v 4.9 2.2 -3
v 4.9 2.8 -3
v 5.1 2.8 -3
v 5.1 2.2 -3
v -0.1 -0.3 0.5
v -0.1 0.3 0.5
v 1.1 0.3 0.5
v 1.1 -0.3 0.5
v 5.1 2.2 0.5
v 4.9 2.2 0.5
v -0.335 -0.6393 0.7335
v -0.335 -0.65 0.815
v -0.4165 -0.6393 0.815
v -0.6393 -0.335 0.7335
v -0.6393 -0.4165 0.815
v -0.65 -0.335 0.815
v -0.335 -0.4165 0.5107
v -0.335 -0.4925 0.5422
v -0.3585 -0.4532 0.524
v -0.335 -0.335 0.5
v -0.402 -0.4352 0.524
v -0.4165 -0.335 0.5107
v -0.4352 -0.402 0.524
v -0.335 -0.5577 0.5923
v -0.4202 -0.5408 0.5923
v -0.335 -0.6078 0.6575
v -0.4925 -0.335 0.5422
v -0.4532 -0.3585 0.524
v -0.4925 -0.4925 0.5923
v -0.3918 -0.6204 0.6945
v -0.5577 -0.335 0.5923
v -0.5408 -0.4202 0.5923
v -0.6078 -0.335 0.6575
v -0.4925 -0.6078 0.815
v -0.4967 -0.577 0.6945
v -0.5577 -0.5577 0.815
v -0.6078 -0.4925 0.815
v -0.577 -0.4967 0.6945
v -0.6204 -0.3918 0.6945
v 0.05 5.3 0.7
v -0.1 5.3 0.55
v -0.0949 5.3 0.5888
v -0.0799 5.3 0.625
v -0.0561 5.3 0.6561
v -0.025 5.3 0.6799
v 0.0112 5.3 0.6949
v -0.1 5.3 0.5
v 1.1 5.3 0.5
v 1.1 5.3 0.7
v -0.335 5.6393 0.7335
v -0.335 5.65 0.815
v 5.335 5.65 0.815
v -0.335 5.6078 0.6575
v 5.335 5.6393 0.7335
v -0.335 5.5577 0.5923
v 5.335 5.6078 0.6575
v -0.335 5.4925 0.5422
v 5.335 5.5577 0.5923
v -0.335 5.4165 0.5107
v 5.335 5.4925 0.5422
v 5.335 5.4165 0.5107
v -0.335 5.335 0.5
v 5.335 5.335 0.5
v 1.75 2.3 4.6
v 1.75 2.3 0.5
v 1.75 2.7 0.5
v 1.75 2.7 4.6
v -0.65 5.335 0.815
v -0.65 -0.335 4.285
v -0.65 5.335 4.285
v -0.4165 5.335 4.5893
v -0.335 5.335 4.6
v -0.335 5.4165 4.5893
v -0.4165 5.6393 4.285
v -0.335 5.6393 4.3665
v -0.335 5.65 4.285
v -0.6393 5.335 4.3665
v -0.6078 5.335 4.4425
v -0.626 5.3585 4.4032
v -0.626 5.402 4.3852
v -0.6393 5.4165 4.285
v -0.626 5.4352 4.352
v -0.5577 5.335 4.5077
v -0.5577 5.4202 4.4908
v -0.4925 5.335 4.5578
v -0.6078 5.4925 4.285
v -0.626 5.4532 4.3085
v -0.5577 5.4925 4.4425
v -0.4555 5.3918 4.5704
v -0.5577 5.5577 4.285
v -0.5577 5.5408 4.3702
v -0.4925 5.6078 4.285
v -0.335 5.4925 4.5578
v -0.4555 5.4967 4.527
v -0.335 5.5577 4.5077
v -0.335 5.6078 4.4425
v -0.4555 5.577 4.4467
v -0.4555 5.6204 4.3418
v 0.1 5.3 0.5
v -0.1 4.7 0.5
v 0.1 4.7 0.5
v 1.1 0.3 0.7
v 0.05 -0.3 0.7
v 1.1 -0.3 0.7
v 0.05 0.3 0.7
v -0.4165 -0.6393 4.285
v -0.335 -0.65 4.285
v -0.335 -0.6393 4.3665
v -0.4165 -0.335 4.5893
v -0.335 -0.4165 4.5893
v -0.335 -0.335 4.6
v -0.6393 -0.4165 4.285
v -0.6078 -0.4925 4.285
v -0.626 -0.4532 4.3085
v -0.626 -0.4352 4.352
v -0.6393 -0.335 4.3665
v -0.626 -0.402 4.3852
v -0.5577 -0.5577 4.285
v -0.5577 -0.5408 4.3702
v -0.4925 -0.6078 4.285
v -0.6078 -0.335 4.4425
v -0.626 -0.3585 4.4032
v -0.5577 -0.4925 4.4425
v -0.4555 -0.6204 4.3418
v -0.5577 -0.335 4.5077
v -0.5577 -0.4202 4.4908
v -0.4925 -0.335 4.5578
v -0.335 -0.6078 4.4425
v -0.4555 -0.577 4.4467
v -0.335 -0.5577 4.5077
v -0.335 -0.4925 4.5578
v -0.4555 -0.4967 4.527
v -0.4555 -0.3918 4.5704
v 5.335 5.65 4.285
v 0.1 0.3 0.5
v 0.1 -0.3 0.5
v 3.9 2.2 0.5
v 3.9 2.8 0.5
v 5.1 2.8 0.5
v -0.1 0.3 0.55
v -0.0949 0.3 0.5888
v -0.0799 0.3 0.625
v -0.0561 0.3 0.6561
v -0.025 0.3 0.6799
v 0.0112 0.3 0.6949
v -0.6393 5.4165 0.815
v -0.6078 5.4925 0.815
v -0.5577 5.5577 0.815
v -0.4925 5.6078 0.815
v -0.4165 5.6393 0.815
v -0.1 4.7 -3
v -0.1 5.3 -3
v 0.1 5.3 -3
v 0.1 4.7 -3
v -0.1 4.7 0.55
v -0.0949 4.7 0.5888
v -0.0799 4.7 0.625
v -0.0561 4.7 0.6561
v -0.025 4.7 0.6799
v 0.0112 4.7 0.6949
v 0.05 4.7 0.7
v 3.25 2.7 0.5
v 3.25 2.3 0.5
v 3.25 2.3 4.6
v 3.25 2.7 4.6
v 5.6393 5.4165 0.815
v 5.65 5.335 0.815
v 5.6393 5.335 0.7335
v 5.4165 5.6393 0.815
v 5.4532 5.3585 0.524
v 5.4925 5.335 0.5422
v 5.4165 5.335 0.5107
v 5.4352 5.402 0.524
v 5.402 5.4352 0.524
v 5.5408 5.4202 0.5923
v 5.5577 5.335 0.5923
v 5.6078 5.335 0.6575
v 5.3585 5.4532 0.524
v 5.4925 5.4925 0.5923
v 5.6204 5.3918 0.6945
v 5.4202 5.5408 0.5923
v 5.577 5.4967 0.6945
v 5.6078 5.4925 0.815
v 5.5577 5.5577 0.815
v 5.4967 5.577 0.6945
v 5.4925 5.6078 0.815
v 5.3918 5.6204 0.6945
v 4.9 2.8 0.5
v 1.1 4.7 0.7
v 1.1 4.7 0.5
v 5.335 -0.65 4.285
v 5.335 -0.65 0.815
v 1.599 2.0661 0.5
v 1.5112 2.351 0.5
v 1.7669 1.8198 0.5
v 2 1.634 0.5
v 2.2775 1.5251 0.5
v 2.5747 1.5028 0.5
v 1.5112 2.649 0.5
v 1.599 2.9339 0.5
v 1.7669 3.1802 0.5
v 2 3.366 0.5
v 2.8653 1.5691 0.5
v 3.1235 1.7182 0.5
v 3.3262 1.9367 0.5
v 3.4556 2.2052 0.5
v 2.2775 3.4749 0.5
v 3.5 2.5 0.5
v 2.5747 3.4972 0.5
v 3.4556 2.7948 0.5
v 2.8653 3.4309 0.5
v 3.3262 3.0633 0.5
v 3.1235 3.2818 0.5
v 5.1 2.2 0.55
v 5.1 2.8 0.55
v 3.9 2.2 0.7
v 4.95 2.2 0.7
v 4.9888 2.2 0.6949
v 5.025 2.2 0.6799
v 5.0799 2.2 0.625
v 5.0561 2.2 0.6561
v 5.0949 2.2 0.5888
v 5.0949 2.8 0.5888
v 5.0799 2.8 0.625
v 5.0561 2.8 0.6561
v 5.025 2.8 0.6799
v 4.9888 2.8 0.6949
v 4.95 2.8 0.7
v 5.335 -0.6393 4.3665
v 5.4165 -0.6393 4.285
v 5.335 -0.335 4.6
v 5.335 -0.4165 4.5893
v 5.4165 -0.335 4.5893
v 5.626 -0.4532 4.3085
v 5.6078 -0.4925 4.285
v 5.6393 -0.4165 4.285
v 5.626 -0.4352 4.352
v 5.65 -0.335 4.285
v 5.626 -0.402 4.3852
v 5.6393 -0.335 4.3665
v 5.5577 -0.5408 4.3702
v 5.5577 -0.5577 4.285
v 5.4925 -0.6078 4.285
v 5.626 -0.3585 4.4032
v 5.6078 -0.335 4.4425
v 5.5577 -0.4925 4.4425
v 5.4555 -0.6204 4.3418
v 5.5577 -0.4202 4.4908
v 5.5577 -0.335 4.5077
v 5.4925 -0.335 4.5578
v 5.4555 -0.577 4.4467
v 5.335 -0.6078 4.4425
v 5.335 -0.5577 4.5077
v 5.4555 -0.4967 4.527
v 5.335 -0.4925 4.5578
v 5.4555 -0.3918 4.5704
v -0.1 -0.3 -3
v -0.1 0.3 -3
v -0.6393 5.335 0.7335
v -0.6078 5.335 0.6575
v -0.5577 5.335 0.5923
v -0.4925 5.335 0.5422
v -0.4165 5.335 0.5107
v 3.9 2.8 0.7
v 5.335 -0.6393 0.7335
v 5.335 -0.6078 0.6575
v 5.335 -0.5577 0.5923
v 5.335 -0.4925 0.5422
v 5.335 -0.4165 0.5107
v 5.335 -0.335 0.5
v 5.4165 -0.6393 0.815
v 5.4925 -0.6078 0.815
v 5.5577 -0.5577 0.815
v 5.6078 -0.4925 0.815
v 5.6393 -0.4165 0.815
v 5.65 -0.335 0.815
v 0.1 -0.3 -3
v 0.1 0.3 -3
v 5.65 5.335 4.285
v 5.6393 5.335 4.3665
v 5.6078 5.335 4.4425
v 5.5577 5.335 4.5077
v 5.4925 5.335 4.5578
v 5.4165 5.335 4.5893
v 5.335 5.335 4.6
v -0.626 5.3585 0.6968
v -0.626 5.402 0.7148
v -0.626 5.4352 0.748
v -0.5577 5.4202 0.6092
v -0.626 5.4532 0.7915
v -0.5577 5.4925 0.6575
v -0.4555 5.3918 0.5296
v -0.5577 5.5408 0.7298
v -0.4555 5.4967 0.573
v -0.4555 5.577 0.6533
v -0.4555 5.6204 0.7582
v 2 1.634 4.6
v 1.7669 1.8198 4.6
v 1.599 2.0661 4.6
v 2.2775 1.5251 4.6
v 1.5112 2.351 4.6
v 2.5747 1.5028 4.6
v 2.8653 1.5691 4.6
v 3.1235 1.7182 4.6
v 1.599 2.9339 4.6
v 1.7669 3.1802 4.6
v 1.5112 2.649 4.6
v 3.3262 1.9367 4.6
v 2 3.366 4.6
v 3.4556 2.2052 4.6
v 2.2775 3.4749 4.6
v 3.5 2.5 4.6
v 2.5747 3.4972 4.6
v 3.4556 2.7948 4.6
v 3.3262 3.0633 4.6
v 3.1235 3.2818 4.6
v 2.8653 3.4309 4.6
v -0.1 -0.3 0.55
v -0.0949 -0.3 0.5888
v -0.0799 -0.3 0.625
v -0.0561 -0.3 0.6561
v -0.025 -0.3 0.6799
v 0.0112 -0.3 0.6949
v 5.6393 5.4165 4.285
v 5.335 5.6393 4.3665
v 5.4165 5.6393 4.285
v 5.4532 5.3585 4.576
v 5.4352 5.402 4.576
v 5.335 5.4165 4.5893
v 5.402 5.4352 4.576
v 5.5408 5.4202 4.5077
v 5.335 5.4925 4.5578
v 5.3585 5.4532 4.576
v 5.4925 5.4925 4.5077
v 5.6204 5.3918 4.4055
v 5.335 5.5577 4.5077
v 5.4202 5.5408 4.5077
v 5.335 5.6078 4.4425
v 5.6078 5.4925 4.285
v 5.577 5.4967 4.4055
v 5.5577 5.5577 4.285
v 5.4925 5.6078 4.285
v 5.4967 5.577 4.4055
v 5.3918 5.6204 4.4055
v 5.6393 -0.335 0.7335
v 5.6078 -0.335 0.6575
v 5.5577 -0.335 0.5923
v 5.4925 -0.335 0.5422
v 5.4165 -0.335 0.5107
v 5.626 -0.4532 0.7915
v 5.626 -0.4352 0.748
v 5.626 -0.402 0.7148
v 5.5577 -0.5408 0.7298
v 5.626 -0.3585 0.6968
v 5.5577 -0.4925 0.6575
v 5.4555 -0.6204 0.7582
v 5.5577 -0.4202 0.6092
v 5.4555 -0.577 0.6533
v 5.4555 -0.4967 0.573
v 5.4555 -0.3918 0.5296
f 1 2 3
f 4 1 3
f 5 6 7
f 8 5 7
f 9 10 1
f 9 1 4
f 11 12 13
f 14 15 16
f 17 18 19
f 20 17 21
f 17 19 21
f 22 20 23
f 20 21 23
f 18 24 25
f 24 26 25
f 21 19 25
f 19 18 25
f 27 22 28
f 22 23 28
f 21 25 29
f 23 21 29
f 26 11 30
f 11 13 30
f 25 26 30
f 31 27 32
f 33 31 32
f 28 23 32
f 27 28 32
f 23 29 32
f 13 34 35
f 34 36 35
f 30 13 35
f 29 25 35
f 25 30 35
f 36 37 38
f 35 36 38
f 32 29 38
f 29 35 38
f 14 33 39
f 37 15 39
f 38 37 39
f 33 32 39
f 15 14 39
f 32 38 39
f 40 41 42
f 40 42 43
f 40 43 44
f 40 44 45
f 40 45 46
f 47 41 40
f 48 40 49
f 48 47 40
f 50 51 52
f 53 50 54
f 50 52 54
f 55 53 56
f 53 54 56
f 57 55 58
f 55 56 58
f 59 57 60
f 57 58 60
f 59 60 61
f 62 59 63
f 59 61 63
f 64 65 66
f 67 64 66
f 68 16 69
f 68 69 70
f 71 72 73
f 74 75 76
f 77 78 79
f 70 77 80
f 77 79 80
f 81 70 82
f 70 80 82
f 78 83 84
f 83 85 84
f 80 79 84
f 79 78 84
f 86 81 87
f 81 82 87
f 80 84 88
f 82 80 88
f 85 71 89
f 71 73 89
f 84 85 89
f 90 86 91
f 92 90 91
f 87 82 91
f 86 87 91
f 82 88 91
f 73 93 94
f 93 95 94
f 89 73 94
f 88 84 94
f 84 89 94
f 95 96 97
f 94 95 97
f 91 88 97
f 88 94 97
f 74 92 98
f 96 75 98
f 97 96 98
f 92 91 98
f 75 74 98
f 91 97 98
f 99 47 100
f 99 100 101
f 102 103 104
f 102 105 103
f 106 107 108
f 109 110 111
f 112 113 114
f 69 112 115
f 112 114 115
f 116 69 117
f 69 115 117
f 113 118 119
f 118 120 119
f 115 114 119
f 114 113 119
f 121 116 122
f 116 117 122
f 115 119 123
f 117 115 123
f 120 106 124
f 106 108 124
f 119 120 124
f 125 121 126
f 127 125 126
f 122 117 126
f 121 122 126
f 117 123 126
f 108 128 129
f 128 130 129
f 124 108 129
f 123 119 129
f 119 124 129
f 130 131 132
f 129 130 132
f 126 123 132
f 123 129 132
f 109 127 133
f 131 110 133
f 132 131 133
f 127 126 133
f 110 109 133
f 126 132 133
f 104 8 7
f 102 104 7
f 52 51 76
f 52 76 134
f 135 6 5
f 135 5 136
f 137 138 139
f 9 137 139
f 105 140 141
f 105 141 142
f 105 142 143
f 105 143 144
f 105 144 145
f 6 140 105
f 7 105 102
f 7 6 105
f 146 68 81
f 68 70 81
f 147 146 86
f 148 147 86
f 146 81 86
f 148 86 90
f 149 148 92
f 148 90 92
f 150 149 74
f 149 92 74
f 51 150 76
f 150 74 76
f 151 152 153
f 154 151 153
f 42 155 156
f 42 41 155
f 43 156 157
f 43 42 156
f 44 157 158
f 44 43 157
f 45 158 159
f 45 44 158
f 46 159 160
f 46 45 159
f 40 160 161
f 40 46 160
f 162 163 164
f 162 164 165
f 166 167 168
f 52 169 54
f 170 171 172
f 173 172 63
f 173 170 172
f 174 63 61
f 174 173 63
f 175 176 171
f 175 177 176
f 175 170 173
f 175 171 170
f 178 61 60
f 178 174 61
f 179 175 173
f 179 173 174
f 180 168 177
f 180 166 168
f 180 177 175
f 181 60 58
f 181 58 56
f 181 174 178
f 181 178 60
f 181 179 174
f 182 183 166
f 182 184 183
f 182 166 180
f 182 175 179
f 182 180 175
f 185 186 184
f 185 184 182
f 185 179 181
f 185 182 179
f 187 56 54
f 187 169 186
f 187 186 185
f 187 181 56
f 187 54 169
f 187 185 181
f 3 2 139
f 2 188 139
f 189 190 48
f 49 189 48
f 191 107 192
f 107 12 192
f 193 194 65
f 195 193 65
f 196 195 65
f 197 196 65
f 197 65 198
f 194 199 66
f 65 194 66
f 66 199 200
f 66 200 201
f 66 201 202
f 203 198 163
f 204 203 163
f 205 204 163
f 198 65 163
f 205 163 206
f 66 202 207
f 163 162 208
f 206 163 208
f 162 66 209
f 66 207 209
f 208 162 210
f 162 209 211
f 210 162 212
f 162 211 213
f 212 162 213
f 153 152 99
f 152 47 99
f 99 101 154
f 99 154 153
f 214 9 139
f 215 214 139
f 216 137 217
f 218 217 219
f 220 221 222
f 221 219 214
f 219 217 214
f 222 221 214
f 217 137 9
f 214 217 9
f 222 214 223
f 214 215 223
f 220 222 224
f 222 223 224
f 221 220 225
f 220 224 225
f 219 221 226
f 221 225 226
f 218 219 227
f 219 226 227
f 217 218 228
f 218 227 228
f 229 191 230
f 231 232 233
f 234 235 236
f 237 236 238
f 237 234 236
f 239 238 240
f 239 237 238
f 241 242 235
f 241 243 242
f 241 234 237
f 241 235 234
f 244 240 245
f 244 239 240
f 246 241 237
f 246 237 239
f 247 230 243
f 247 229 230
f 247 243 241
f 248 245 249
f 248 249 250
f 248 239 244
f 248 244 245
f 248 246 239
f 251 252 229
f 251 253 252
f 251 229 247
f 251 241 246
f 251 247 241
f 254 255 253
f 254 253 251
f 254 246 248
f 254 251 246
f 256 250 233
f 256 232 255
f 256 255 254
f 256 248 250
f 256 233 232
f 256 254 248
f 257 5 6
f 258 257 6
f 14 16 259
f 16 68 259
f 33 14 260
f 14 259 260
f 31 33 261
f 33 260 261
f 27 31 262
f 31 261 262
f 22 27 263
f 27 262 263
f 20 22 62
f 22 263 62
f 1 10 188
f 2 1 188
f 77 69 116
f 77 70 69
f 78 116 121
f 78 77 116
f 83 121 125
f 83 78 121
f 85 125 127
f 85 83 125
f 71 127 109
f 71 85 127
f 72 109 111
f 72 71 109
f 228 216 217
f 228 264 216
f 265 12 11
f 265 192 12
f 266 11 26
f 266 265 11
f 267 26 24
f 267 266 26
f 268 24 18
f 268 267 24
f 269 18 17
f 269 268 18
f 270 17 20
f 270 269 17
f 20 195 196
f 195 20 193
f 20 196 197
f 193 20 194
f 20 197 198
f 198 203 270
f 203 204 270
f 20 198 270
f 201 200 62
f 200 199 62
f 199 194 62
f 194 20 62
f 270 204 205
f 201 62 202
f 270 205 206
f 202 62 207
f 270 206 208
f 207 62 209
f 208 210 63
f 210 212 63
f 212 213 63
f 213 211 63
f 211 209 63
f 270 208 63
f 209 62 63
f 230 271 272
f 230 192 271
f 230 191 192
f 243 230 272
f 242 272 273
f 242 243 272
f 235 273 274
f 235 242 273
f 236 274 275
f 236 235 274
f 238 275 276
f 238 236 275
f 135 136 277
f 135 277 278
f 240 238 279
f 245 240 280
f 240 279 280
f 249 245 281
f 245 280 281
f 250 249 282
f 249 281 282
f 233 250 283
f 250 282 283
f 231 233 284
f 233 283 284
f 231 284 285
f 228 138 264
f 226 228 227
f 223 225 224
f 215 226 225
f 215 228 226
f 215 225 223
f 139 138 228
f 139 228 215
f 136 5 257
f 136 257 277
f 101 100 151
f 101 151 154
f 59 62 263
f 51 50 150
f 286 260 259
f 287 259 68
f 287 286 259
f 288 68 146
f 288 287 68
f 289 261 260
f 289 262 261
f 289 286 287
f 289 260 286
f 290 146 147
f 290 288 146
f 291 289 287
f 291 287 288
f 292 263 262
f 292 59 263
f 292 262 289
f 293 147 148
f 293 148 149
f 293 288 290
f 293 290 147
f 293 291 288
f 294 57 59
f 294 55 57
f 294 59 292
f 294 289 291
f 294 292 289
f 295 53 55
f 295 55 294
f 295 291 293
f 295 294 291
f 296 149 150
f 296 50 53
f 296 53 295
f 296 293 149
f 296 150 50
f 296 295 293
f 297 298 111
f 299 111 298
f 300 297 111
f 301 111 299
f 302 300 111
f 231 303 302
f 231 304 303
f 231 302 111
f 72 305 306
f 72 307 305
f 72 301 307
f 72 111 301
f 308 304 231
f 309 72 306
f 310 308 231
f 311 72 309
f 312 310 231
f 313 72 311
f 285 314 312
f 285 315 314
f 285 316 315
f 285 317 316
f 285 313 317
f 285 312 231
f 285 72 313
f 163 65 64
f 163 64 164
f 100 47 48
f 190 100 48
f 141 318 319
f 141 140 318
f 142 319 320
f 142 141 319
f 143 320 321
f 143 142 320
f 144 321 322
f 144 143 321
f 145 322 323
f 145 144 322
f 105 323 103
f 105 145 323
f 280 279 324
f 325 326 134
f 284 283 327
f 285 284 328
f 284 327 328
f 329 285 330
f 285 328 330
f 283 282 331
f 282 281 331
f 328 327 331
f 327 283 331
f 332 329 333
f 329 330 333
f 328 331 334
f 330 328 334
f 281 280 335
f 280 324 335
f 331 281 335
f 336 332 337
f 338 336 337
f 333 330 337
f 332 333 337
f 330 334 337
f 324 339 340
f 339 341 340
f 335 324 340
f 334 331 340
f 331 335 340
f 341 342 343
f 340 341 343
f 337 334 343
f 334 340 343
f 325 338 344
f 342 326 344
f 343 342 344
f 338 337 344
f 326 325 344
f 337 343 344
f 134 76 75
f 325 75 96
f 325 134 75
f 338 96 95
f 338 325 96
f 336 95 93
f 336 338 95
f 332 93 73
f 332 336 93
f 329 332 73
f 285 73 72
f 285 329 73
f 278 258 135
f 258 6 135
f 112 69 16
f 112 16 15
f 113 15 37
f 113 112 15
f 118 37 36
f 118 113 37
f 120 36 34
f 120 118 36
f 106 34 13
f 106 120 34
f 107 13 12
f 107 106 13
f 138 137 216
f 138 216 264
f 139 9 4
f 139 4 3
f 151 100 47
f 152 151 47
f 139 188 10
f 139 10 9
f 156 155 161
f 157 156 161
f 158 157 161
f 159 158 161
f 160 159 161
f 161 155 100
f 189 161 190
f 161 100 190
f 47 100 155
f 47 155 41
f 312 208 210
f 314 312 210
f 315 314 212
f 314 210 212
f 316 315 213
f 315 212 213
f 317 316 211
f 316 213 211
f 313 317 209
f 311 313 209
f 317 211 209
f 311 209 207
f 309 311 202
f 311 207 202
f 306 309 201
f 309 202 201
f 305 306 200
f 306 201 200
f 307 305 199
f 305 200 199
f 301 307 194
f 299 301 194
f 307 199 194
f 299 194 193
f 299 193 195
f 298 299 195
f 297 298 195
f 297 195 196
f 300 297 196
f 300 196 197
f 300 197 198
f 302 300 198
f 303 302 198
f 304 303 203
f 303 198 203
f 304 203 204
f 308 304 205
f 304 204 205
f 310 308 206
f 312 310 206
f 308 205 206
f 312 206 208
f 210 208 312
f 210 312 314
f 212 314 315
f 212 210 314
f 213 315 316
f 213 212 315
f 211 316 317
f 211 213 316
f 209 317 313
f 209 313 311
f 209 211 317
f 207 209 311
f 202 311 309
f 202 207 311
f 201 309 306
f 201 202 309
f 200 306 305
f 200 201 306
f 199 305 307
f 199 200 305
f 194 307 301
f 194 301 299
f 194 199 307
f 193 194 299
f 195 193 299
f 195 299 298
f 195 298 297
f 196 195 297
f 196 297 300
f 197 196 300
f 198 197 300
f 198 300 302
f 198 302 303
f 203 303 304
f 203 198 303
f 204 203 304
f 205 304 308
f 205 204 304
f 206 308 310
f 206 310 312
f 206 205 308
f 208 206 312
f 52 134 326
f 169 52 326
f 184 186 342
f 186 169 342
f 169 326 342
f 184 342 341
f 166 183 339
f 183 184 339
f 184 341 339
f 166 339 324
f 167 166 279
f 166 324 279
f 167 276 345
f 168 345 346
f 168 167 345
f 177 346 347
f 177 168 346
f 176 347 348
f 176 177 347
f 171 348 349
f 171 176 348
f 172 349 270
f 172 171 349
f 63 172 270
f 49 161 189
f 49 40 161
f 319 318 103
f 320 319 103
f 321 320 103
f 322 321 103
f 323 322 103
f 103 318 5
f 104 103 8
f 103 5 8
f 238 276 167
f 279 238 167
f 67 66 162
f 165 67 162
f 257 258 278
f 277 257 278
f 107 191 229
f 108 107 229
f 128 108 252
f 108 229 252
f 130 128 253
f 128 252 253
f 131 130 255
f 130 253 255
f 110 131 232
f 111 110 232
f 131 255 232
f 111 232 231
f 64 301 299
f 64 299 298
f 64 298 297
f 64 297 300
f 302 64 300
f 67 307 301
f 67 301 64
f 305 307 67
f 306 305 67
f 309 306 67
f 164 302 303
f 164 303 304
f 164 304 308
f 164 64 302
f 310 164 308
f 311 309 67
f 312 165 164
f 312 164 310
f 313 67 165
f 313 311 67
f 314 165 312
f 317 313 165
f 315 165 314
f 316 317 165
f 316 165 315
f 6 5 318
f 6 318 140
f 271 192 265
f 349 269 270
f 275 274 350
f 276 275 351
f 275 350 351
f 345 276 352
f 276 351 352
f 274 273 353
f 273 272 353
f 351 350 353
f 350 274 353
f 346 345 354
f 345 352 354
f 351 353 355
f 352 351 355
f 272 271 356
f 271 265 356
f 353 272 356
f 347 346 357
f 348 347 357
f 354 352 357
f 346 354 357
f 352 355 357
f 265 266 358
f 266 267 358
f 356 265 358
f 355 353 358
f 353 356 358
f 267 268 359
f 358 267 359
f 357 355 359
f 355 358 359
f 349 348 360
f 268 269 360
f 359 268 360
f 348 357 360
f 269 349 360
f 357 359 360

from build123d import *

# Parameters (mm, degrees)
SKETCH003_W       = 0.2
SKETCH003_H       = 0.6
PAD002_DEPTH      = 0.5
PAD002_DEPTH_BACK = 3
SKETCH004_R       = 1
SKETCH004_W       = 1.5
SKETCH004_H       = 0.4
PAD003_DEPTH      = 4.1
SKETCH_W          = 6.3
SKETCH_H          = 6.3
SKETCH_R          = 1
PAD_DEPTH         = 4.1
FILLET_R          = 0.315
SKETCH005_W       = 1.2
SKETCH005_H       = 0.6
PAD004_DEPTH      = 0.2
FILLET001_R       = 0.15


with BuildPart() as pad002:
    # Sketch003 → Pad002 (new body, two sides)
    with BuildSketch(Plane(origin=(0, 5, 0), x_dir=(1, 0, 0), z_dir=(0, 0, 1))) as pad002_sk:
        Rectangle(SKETCH003_W, SKETCH003_H)
        with Locations((5, -2.5)):
            Rectangle(SKETCH003_W, SKETCH003_H)
        with Locations((0, -5)):
            Rectangle(SKETCH003_W, SKETCH003_H)
    extrude(amount=PAD002_DEPTH)
    extrude(pad002_sk.sketch, amount=-PAD002_DEPTH_BACK)


with BuildPart() as pad003:
    # Sketch004 → Pad003 (new body)
    with BuildSketch(Plane(origin=(0, 5, 0.5), x_dir=(1, 0, 0), z_dir=(0, 0, 1))):
        with Locations((2.5, -2.5)):
            Circle(SKETCH004_R)
        with Locations((2.5, -2.5)):
            Rectangle(SKETCH004_W, SKETCH004_H, mode=Mode.SUBTRACT)
    extrude(amount=PAD003_DEPTH)


with BuildPart() as fillet_body:
    # Sketch → Pad (new body)
    with BuildSketch(Plane(origin=(0, 5, 0.5), x_dir=(1, 0, 0), z_dir=(0, 0, 1))):
        with Locations((2.5, -2.5)):
            Rectangle(SKETCH_W, SKETCH_H)
        with Locations((2.5, -2.5)):
            Circle(SKETCH_R, mode=Mode.SUBTRACT)
    extrude(amount=PAD_DEPTH)

    # Fillet
    fillet_edges = [fillet_body.edges().sort_by_distance(p)[0] for p in [
        (2.5, -0.65, 4.6),
        (-0.65, -0.65, 2.55),
        (2.5, -0.65, 0.5),
        (5.65, -0.65, 2.55),
        (5.65, 5.65, 2.55),
        (5.65, 2.5, 4.6),
        (5.65, 2.5, 0.5),
        (2.5, 5.65, 4.6),
        (-0.65, 2.5, 4.6),
        (2.5, 5.65, 0.5),
        (-0.65, 2.5, 0.5),
        (-0.65, 5.65, 2.55),
    ]]
    fillet(fillet_edges, radius=FILLET_R)


with BuildPart() as fillet001:
    # Sketch005 → Pad004 (new body)
    with BuildSketch(Plane(origin=(0, 5, 0.5), x_dir=(1, 0, 0), z_dir=(0, 0, 1))):
        with Locations((0.5, 0)):
            Rectangle(SKETCH005_W, SKETCH005_H)
        with Locations((4.5, -2.5)):
            Rectangle(SKETCH005_W, SKETCH005_H)
        with Locations((0.5, -5)):
            Rectangle(SKETCH005_W, SKETCH005_H)
    extrude(amount=PAD004_DEPTH)

    # Fillet001
    fillet001_edges = [fillet001.edges().sort_by_distance(p)[0] for p in [
        (5.1, 2.5, 0.7),
        (-0.1, 5, 0.7),
        (-0.1, 0, 0.7),
    ]]
    fillet(fillet001_edges, radius=FILLET001_R)


solid = Compound([pad002.part, pad003.part, fillet_body.part, fillet001.part])
